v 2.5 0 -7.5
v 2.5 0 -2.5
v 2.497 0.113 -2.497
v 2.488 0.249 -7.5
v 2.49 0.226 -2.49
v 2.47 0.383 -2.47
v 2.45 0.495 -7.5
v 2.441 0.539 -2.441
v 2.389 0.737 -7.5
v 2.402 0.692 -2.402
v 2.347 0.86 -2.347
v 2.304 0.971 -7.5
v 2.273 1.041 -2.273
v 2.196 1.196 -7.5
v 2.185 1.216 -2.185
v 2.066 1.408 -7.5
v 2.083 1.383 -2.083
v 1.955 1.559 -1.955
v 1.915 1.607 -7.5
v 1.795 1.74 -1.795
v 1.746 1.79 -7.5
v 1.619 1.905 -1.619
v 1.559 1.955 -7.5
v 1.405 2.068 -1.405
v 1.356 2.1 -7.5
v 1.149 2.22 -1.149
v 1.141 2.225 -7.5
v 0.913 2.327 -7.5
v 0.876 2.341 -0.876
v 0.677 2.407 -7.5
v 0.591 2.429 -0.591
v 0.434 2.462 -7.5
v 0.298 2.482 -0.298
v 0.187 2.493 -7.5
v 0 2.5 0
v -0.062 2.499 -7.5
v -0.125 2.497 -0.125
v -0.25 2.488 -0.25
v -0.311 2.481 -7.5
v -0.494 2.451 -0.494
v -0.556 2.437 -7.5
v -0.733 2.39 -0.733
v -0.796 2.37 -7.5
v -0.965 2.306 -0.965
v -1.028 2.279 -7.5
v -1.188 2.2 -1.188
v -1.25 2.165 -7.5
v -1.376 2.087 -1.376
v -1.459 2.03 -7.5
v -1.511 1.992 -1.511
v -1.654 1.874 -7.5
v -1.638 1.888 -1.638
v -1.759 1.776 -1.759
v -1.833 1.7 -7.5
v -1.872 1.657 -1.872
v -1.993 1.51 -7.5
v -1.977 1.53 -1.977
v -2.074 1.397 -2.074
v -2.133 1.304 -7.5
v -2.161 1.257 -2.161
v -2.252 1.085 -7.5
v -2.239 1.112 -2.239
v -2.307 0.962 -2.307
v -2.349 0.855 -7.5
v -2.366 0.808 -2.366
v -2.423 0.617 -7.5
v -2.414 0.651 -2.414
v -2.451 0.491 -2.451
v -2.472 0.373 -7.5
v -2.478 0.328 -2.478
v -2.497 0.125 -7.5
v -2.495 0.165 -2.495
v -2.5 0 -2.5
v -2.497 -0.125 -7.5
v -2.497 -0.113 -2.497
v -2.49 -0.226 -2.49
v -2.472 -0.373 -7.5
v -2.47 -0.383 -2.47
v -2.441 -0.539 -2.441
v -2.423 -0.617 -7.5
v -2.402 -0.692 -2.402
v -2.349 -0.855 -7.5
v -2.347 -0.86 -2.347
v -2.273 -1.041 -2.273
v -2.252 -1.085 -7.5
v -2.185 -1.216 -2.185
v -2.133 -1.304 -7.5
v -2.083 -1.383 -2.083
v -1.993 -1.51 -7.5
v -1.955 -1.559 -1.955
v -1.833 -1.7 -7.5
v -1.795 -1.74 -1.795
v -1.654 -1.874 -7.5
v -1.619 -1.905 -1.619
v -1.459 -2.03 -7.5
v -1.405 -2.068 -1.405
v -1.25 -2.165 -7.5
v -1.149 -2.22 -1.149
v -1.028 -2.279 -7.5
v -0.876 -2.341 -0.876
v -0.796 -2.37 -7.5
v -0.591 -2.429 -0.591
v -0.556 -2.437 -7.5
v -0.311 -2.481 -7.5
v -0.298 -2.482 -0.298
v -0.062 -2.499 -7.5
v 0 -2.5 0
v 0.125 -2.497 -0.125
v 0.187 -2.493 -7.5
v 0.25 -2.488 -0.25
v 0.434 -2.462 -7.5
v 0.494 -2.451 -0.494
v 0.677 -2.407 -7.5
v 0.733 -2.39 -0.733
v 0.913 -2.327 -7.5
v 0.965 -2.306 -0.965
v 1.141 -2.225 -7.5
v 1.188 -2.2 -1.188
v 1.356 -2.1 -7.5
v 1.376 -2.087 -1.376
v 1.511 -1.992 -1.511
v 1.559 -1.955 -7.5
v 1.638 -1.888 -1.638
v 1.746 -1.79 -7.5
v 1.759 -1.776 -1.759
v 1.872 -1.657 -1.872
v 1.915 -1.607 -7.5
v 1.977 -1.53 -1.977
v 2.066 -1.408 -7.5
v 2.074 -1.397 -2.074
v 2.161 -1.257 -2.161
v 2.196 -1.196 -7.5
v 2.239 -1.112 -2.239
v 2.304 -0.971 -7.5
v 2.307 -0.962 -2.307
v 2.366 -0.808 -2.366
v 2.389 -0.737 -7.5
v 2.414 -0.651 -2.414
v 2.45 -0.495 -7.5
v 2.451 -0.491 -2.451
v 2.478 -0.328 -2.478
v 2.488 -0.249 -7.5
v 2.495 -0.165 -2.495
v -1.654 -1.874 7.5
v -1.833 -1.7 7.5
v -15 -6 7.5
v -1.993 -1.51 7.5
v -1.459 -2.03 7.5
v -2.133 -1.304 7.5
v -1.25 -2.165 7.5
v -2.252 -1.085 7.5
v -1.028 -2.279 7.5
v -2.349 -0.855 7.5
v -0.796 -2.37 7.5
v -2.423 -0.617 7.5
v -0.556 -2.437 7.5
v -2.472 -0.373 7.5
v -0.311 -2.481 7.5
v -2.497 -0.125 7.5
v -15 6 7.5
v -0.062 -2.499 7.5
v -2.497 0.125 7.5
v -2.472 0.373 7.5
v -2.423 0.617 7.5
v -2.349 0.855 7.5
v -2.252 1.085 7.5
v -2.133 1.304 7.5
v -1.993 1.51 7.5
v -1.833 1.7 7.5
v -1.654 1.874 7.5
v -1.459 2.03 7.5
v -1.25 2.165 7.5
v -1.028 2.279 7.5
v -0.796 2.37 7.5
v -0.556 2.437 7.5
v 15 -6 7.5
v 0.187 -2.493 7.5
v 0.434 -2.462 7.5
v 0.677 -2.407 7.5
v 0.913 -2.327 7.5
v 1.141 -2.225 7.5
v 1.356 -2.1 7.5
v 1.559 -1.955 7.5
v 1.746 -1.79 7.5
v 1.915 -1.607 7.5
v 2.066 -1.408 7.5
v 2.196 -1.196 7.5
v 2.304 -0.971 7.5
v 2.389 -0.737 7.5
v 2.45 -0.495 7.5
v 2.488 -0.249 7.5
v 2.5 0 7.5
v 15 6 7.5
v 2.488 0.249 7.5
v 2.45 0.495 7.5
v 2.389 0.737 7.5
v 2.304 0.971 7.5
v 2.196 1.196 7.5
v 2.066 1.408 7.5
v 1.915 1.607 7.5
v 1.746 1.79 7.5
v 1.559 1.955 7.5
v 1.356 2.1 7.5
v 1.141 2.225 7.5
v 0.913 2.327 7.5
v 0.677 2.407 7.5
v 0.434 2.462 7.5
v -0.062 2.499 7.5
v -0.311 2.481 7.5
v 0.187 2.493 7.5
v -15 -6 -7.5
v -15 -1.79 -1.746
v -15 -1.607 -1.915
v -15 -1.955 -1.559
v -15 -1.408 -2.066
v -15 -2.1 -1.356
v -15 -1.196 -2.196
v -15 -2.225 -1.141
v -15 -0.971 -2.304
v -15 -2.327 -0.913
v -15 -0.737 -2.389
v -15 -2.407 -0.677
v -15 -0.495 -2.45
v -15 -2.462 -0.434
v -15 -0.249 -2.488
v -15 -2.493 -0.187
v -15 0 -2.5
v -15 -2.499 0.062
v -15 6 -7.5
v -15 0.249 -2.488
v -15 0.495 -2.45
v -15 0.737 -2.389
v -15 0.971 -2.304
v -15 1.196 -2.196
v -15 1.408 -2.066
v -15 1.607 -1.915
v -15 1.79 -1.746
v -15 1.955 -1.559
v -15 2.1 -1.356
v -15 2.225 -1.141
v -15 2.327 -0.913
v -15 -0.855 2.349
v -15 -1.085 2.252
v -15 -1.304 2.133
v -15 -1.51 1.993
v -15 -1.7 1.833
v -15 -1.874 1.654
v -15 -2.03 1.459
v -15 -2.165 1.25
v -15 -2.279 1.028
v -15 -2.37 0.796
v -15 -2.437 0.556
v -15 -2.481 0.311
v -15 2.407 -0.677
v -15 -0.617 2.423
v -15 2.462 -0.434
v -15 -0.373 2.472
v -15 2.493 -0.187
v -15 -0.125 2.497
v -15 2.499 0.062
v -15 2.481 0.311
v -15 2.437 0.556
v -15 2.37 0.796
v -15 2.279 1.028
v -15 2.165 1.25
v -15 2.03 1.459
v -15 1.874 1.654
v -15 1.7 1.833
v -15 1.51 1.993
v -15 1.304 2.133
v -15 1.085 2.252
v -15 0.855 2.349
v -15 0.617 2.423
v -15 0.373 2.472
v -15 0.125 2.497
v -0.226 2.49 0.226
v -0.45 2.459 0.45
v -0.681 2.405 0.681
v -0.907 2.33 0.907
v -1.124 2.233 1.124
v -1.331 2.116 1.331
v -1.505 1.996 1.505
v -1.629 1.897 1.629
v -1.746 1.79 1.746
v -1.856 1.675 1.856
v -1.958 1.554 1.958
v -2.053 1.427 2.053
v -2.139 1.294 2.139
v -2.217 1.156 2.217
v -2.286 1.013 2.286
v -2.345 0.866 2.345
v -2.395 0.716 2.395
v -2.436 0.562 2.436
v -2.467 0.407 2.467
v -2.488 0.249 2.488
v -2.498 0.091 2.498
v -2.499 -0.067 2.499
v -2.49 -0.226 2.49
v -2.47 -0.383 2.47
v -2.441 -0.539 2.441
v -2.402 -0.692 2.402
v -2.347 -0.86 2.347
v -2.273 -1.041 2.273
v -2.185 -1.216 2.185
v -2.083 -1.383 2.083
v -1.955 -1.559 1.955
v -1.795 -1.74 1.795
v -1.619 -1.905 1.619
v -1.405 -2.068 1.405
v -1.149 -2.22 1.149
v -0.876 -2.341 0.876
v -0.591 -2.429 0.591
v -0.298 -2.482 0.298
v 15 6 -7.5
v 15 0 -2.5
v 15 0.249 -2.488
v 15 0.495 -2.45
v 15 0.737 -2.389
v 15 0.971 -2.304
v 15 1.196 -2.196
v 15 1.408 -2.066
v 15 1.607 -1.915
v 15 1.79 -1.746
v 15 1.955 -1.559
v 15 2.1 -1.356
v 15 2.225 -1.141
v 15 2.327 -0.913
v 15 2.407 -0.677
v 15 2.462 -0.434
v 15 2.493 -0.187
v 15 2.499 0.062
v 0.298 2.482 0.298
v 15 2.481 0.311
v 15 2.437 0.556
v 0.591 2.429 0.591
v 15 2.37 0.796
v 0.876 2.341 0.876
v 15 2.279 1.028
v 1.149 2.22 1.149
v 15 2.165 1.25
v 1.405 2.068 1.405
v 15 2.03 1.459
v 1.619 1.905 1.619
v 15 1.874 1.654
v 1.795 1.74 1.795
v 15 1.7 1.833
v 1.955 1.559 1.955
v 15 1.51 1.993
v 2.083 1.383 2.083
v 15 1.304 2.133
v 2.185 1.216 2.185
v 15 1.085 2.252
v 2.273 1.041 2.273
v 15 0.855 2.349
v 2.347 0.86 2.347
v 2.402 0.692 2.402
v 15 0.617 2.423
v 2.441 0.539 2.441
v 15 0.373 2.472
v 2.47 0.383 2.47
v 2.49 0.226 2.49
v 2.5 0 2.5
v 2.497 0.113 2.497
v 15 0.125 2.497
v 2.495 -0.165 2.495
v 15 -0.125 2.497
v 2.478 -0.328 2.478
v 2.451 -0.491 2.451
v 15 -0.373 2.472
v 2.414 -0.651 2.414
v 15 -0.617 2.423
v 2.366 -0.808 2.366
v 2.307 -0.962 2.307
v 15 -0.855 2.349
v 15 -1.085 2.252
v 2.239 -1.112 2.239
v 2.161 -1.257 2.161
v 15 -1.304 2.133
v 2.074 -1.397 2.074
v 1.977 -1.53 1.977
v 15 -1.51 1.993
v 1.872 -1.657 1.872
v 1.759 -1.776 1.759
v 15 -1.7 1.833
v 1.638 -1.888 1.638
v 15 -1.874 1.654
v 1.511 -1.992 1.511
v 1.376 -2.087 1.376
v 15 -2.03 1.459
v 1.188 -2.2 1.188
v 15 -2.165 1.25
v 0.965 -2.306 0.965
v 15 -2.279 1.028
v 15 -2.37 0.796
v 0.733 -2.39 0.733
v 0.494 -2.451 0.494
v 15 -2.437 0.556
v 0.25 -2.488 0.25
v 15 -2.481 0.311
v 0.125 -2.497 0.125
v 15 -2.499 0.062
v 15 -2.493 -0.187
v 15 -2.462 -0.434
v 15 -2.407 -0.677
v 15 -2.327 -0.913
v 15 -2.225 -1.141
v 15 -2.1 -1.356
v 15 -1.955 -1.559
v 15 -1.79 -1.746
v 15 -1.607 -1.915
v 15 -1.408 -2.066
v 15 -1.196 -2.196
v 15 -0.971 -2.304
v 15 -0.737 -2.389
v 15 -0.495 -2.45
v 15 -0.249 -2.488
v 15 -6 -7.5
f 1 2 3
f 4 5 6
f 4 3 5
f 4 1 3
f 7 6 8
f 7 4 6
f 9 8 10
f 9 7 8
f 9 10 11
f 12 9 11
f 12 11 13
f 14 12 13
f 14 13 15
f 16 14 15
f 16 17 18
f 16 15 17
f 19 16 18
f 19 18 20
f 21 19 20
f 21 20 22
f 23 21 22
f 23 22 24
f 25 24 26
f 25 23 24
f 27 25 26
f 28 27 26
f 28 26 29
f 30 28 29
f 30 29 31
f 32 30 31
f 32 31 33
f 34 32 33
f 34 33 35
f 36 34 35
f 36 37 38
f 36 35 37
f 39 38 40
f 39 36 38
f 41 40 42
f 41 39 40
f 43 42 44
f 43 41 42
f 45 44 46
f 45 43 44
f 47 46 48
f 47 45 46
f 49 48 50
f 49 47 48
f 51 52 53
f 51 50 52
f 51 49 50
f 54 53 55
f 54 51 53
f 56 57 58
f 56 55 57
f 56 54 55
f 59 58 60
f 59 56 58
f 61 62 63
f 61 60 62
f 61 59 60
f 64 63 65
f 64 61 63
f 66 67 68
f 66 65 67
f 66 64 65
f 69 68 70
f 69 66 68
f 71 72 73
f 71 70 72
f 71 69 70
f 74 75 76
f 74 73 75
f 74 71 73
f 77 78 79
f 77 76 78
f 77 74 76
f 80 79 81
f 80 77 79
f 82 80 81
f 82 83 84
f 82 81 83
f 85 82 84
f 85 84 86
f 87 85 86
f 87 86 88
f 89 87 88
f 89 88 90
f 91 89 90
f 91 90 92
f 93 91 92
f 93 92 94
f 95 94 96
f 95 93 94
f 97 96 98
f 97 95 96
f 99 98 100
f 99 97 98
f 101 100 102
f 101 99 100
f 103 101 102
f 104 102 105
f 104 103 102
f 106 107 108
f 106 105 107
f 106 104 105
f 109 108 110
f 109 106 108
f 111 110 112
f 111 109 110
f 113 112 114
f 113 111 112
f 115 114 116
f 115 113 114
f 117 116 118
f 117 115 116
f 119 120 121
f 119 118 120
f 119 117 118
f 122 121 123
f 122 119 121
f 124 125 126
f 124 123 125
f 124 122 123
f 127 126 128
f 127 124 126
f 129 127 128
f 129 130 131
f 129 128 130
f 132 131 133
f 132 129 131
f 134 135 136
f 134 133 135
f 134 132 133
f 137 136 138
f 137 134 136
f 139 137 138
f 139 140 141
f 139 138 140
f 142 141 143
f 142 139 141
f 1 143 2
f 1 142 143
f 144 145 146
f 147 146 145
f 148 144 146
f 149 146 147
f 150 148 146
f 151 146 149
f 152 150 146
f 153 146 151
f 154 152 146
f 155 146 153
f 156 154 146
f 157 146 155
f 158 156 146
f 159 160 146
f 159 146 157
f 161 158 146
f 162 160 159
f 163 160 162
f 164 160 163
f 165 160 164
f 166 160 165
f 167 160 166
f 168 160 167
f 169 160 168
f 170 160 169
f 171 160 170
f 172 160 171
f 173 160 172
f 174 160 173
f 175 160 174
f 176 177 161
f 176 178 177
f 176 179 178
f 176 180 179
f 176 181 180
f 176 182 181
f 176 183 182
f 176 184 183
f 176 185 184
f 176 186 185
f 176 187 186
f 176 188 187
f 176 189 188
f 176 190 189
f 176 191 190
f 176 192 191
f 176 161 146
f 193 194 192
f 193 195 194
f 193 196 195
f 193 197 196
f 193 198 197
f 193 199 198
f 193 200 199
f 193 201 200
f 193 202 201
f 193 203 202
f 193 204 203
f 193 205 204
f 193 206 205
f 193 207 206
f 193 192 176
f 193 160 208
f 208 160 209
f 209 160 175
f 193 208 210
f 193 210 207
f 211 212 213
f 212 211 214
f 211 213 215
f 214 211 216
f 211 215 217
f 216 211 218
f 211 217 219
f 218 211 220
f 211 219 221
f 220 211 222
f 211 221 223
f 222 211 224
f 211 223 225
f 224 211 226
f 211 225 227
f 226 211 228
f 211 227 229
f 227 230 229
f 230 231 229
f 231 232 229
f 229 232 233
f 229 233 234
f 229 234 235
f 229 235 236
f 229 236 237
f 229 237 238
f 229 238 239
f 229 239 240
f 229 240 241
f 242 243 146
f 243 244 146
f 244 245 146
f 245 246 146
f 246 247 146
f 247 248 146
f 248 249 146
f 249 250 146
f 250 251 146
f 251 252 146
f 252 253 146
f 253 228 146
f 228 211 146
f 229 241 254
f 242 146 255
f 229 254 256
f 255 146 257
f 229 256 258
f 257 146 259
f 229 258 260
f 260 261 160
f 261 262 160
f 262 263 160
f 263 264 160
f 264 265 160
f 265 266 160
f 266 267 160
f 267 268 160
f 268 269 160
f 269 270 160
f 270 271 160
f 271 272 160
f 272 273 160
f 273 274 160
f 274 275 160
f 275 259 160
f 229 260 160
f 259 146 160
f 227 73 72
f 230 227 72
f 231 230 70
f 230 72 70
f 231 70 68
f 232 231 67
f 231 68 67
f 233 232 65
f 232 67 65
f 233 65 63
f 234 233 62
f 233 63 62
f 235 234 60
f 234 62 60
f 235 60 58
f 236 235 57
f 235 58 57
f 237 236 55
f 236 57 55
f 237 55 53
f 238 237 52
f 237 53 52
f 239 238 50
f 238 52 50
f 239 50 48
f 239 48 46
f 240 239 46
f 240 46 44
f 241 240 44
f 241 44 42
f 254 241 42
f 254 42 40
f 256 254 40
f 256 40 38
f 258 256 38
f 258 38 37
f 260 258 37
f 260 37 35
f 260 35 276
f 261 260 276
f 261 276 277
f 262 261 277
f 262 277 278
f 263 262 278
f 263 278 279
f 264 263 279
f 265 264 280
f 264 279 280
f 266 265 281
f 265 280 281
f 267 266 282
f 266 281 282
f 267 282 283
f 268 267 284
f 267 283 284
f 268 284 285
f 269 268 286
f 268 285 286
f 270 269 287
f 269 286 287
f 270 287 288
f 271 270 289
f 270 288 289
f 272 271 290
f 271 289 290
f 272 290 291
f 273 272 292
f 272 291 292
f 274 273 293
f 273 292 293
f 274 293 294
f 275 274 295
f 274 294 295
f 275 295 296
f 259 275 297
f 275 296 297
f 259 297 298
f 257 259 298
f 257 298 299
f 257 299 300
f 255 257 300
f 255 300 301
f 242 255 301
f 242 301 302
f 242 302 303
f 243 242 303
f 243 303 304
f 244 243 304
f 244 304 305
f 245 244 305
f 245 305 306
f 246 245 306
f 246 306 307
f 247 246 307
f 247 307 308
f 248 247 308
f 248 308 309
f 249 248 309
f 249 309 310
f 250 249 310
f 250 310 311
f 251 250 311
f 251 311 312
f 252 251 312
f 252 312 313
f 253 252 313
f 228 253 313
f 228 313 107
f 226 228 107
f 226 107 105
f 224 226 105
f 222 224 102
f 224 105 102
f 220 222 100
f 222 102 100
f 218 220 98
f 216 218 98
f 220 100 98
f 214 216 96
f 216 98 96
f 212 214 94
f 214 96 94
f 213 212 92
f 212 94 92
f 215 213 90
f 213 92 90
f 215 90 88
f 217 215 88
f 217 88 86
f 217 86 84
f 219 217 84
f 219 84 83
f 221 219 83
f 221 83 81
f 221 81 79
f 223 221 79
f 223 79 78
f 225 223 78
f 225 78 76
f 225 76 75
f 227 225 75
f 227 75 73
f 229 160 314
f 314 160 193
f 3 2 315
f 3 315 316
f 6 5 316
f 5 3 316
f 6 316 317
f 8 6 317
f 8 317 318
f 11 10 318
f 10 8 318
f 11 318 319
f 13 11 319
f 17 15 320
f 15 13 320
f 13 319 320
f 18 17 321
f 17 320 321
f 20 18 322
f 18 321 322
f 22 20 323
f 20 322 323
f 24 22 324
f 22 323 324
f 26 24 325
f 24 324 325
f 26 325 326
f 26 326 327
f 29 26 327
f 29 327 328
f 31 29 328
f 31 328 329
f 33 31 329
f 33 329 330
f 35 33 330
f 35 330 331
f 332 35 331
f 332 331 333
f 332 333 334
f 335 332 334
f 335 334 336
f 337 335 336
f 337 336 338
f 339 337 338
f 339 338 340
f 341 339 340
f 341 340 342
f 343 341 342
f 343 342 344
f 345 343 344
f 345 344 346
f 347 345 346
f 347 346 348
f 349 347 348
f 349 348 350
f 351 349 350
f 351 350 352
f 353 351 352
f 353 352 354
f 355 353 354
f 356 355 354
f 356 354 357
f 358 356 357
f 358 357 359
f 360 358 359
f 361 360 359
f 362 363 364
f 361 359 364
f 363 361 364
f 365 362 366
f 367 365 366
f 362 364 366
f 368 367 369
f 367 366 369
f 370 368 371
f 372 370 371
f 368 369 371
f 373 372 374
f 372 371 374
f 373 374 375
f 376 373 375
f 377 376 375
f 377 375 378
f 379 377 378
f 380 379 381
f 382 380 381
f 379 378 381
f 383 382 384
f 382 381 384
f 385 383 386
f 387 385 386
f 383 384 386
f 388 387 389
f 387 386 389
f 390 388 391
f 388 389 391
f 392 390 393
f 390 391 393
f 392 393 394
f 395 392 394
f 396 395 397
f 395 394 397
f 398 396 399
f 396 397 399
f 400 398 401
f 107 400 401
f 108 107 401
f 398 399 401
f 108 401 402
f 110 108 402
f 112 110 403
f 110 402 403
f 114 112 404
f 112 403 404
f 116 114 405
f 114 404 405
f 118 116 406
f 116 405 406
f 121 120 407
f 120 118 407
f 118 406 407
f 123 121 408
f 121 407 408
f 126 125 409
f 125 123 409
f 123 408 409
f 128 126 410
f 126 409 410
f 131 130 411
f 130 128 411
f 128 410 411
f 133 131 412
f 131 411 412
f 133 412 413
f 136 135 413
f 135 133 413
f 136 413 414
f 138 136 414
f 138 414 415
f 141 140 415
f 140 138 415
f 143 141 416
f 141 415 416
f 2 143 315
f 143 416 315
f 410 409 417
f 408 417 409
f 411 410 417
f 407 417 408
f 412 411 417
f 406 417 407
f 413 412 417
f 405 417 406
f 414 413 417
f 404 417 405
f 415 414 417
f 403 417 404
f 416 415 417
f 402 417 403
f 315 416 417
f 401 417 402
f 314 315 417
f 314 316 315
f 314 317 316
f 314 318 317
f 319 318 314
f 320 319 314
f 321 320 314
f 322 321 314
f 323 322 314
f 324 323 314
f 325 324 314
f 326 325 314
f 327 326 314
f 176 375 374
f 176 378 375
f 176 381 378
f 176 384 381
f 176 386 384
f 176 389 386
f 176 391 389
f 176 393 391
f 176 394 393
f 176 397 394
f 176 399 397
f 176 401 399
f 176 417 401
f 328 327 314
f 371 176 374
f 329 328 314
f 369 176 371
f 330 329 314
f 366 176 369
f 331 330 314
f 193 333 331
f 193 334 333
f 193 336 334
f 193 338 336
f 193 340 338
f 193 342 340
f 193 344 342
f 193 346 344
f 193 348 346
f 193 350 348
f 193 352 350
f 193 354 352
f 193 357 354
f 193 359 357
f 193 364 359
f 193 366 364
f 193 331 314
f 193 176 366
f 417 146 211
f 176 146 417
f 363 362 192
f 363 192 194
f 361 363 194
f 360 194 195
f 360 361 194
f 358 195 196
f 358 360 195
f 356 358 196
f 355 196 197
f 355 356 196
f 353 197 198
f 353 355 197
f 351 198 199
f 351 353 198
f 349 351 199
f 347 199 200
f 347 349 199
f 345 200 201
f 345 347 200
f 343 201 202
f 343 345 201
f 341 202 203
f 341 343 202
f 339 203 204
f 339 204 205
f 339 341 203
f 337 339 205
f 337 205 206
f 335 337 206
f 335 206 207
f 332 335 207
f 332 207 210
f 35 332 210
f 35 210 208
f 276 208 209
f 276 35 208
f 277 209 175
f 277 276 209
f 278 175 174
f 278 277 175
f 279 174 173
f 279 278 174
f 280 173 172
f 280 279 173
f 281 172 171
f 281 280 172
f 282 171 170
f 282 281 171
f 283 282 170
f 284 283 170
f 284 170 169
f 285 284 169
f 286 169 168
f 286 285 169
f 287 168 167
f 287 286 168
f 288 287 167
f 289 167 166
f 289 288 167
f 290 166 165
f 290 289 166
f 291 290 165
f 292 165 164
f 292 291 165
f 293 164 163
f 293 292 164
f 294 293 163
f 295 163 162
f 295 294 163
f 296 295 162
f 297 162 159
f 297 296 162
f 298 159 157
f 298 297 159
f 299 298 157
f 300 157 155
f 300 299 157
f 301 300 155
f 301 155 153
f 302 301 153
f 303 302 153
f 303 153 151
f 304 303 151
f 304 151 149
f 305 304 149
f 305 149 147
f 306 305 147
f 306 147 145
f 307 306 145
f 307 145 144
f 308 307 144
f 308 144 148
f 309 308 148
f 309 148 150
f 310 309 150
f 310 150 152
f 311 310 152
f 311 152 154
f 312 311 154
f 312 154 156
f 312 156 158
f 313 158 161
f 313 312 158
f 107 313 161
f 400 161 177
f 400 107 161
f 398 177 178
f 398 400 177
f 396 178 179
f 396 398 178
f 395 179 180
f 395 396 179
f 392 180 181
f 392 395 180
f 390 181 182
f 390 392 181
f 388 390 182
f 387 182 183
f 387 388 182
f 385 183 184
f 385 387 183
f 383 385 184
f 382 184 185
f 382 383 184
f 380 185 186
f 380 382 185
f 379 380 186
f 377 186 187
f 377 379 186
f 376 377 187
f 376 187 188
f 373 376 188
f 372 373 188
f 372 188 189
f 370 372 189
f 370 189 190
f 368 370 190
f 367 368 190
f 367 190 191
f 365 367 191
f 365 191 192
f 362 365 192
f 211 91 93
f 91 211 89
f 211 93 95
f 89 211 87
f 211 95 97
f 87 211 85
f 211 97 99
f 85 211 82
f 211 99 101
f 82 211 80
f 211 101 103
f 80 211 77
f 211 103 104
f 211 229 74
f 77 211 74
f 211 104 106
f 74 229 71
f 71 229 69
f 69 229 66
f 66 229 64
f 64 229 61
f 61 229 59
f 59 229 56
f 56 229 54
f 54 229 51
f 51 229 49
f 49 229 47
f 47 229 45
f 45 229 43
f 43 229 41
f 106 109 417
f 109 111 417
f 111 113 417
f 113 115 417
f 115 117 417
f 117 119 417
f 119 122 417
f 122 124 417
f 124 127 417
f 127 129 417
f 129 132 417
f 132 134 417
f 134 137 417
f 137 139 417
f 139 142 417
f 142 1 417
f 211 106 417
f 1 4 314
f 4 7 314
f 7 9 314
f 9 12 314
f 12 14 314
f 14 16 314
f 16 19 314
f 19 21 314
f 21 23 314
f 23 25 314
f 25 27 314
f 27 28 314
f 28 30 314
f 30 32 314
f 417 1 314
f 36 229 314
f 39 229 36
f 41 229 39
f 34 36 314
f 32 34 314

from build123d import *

# Parameters (mm, degrees)
SCHIZZO1_W                   = 30
SCHIZZO1_H                   = 12
SCHIZZO1_R                   = 2.5
ESTRUSIONE_ESTRUSIONE1_DEPTH = 7.5
TAGLIO_ESTRUSIONE1_REACH     = 33.5
SCHIZZO3_R                   = 2.5


with BuildPart() as part:
    # Schizzo1 → Estrusione-Estrusione1 (new, symmetric)
    with BuildSketch(Plane.XY):
        Rectangle(SCHIZZO1_W, SCHIZZO1_H)
        Circle(SCHIZZO1_R, mode=Mode.SUBTRACT)
    extrude(amount=ESTRUSIONE_ESTRUSIONE1_DEPTH, both=True)

    # Taglio-Estrusione1: up to this face of the body (flat: up to its plane)
    taglio_estrusione1_end = Plane(part.part.faces().sort_by_distance((-15, 0, 0))[0])
    # Schizzo3 → Taglio-Estrusione1 (cut, up to the picked face)
    with BuildSketch(Plane(origin=(15, 0, 0), x_dir=(0, 0, -1), z_dir=(1, 0, 0)), mode=Mode.PRIVATE) as taglio_estrusione1_sk1:
        Circle(SCHIZZO3_R)
    taglio_estrusione1_tool1 = split(extrude(taglio_estrusione1_sk1.sketch, amount=-TAGLIO_ESTRUSIONE1_REACH, mode=Mode.PRIVATE), bisect_by=taglio_estrusione1_end, keep=Keep.BOTH, mode=Mode.PRIVATE)
    add(taglio_estrusione1_tool1.solids().sort_by(Axis((15, 0, 0), (-1, 0, 0)))[0], mode=Mode.SUBTRACT)


solid = part.part
